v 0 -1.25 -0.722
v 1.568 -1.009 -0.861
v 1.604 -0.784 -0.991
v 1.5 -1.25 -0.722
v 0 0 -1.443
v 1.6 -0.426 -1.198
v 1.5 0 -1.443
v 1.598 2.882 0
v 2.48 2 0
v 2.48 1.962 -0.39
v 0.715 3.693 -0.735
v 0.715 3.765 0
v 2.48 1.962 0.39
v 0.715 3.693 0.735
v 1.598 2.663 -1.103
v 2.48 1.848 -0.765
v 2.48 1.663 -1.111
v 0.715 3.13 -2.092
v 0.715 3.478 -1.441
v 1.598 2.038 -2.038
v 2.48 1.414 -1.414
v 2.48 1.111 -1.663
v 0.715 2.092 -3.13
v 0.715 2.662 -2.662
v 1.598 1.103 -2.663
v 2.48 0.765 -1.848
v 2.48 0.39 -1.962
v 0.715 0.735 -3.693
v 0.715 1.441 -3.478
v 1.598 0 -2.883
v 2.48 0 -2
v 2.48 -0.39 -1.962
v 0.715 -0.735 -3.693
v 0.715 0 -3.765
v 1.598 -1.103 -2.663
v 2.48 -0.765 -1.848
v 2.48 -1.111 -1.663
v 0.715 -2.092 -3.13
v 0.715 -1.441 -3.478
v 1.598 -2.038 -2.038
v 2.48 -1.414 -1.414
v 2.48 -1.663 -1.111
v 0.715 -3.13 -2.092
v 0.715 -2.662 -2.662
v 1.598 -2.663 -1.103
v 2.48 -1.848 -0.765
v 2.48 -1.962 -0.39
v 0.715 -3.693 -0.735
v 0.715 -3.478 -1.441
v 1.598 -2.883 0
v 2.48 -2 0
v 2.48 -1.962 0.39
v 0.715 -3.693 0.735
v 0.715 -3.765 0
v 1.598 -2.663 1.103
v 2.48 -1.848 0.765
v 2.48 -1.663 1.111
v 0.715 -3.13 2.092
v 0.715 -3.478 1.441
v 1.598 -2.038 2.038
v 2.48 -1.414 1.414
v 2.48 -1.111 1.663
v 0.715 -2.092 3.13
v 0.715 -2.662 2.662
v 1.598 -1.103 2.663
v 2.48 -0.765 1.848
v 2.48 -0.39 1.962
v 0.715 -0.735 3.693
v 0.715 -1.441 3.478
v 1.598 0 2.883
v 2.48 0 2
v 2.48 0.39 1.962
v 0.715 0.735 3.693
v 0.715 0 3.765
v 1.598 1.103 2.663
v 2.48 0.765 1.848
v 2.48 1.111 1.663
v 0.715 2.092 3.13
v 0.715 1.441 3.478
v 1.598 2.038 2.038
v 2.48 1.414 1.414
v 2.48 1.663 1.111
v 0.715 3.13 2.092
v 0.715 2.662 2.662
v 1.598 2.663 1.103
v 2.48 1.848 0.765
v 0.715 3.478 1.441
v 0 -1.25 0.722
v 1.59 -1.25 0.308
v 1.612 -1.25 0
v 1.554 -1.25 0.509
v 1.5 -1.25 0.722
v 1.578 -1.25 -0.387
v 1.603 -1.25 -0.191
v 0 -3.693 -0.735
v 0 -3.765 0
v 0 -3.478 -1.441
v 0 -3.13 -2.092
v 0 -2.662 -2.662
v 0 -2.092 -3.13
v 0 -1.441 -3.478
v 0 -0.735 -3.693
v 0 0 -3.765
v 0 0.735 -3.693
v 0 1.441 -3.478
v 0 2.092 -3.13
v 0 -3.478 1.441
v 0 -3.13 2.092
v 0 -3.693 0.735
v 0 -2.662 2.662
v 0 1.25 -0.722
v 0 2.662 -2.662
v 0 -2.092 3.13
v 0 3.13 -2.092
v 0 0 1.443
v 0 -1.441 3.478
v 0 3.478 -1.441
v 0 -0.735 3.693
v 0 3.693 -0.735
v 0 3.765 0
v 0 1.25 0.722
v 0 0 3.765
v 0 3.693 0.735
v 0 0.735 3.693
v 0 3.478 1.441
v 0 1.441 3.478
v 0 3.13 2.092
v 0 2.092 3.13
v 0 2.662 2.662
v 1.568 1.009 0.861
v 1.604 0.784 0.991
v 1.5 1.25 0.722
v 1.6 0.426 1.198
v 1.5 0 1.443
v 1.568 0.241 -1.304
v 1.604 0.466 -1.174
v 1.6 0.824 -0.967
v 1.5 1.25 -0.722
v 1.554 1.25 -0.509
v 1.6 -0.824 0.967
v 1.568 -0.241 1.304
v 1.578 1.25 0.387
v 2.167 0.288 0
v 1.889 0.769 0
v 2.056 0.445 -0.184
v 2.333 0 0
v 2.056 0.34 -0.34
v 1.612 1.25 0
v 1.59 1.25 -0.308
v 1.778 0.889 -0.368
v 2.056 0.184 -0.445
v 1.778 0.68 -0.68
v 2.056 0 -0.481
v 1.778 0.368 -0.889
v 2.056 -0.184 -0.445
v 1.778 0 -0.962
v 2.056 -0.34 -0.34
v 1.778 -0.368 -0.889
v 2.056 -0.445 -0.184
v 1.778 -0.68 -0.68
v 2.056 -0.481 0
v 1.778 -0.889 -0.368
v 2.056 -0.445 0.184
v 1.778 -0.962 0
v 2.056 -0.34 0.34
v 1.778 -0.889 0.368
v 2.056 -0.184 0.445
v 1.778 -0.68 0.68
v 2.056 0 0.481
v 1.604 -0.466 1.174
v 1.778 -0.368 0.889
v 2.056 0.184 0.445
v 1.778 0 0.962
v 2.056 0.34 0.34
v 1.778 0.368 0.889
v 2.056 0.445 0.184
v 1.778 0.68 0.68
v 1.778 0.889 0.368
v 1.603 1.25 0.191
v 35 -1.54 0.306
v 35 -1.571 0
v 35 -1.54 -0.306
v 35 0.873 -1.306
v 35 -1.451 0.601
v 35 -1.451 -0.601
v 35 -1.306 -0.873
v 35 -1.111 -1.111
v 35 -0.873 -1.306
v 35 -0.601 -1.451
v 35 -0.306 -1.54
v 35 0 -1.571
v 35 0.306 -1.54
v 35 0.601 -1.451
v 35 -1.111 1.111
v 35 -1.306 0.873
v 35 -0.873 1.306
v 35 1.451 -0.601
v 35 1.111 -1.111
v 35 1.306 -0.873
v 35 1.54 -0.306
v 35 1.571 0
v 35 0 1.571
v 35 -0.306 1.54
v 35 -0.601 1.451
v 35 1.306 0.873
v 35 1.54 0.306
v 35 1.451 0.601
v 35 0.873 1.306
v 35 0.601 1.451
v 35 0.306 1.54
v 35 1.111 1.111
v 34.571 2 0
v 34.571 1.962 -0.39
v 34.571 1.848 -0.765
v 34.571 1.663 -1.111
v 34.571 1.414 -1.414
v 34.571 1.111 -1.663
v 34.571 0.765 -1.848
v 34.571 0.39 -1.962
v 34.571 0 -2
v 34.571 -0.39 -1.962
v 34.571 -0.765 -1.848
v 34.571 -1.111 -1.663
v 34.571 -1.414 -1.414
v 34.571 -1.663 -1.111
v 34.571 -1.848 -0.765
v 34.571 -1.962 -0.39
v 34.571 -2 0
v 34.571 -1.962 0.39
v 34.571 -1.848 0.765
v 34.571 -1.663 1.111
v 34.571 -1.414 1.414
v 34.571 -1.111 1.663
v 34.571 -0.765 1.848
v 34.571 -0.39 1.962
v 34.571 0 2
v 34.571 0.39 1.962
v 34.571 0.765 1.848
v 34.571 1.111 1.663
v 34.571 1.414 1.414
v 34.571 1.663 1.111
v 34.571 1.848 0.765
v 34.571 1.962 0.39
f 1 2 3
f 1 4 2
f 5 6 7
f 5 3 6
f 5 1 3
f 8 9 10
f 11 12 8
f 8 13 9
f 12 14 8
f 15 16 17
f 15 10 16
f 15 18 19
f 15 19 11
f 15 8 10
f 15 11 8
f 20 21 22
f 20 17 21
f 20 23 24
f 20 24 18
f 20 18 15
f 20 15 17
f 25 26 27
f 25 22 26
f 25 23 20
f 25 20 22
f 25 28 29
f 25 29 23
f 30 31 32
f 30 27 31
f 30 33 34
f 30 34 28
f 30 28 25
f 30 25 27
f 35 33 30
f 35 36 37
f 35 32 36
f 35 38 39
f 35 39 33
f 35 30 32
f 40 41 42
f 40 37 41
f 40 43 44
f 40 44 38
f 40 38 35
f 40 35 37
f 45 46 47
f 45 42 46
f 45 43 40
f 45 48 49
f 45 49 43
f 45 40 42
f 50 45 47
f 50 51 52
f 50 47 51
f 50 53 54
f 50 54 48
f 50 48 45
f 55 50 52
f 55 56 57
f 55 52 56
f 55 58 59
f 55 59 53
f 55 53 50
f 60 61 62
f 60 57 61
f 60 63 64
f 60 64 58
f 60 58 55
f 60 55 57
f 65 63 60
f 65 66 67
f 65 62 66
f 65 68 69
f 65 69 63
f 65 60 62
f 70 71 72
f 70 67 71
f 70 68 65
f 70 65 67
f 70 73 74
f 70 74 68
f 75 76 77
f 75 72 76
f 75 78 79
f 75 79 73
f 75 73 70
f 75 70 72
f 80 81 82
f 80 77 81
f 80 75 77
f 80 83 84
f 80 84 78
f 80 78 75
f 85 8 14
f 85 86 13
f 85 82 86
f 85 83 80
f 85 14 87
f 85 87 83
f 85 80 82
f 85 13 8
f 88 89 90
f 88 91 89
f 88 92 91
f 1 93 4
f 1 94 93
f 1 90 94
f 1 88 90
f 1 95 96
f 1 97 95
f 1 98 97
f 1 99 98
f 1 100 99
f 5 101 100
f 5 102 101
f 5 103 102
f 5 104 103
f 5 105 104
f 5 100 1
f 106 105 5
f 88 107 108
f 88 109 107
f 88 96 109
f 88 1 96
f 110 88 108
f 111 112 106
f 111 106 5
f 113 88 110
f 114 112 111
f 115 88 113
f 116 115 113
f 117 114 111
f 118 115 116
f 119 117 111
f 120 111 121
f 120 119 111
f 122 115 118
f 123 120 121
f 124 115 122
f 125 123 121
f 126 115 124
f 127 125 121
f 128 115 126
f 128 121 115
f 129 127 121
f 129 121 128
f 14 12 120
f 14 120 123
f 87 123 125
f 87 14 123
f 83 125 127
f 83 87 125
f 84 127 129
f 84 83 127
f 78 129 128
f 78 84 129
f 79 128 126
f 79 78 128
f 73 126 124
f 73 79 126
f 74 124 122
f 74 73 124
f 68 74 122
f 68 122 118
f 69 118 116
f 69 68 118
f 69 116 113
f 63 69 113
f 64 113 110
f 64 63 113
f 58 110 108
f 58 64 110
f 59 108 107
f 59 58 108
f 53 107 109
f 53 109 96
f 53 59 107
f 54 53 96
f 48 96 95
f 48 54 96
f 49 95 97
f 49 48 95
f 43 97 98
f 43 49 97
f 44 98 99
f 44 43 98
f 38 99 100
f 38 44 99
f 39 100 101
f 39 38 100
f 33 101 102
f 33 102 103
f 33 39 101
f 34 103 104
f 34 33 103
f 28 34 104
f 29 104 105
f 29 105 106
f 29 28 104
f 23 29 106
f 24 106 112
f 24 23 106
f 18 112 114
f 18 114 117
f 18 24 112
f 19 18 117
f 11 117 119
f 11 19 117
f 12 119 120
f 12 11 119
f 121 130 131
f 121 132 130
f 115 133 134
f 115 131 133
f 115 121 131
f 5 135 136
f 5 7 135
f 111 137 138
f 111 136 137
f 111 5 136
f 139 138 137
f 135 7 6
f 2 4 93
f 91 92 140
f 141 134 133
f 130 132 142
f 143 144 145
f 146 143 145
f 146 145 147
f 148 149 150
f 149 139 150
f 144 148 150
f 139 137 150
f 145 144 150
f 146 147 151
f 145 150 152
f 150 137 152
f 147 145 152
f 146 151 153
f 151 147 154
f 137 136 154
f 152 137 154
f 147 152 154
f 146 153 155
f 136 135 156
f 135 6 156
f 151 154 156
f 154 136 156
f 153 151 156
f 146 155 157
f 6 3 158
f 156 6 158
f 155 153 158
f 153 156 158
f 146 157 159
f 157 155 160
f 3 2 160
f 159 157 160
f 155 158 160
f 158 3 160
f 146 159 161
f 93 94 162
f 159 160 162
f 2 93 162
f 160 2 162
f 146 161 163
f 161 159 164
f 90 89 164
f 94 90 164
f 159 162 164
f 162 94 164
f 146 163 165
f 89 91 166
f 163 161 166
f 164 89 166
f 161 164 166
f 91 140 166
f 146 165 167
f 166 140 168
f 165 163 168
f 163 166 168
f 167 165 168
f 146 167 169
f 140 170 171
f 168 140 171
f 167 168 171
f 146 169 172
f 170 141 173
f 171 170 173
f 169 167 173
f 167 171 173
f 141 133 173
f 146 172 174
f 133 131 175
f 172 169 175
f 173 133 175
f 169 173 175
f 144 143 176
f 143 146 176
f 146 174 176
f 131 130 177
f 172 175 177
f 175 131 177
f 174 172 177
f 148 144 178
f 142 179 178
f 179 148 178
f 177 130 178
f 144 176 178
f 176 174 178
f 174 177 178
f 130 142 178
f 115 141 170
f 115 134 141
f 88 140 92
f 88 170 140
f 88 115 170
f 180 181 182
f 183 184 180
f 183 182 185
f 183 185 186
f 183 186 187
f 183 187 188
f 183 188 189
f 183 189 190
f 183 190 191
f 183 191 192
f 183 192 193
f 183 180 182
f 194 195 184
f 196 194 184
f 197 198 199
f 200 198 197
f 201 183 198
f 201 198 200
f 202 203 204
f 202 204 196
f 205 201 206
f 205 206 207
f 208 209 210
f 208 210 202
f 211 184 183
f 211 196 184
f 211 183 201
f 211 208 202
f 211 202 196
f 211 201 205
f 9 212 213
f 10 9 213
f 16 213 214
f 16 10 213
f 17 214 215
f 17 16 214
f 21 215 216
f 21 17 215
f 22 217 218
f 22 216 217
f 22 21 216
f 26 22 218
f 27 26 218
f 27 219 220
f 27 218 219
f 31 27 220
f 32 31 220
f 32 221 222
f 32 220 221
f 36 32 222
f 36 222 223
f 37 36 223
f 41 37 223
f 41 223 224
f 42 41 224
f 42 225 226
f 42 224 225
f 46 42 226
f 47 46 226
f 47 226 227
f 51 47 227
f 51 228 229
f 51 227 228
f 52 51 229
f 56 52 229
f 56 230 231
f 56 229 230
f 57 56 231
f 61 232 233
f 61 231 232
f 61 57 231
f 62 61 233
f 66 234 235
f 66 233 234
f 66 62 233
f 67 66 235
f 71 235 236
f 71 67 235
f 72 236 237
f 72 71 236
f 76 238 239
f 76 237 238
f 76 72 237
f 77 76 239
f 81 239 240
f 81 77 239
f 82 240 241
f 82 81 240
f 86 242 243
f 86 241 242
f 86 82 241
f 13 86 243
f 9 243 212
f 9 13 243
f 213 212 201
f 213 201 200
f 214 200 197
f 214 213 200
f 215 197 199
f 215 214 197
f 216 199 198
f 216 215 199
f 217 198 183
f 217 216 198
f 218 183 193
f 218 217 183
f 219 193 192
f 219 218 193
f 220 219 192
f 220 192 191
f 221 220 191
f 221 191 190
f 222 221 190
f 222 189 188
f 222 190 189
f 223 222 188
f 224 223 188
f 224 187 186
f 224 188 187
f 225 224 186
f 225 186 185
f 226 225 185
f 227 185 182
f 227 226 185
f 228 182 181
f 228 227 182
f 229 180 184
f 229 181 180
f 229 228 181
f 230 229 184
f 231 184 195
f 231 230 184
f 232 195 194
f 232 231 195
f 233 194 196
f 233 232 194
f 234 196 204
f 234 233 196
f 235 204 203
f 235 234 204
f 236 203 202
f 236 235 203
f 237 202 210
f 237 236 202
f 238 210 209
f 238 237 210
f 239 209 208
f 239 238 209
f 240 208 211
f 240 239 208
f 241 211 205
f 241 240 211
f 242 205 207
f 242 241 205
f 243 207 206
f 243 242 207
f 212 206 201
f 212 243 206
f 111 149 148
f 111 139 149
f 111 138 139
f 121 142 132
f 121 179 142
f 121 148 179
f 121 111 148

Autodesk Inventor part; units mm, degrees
ref_plane "YZ Plane" through (0, 0, 0) normal (1, 0, 0) x (0, 1, 0)
ref_plane "XZ Plane" through (0, 0, 0) normal (0, 1, 0) x (-1, 0, 0)
sketch "Sketch1" plane through (0, 0, 0) normal (0, 0, 1) x (1, 0, 0)
  line L0 (35, 0) -> (35, 2)
  line L1 (35, 2) -> (15, 2)
  line L2 (15, 2) -> (14.5706, 2)
  line L3 (0, 3.765) -> (0, 1.4434)
  line L4 (0, 1.4434) -> (1.5, 1.4434)
  line L5 (1.5, 1.4434) -> (2.3333, 0)
  line L6 (2.3333, 0) -> (35, 0)
  line L7 (0, 3.765) -> (0.715, 3.765)
  line L8 (0.715, 3.765) -> (2.48, 2)
  line L9 (14.5706, 2) -> (2.48, 2)
  line L10 (15, 2) -> (2.48, 2) construction
  line L11 (2.48, 2) -> (2.48, 2)
  line L12 (-7, 0) -> (42, 0) projected
  line L13 (0, -0.753) -> (0, 4.518) projected
  dimension "d0" = 35
  dimension "d1" = 20
  dimension "d2" = 1.5
  dimension "d3" = 4
  dimension "d6" = 2.48
  dimension "d7" = 45
  dimension "d8" = 2.8868
  dimension "d9" = 60
  dimension "d10" = 7.53
  dimension "d11" = 4
  dimension "d12" = 0.4294
revolve "Body" add sketch "Sketch1" angle 360 about axis through (2.3333, 0, 0) along (1, 0, 0) contours L6 L5 L4 L3 L7 L8 L9 L2 L1 L0
sketch "Sketch2" plane through (0, 0, 0) normal (-1, 0, 0) x (0, 0, 1)
  circle A0 centre (0, 0) radius 1.4434 projected
  line L0 (0, -5.271) -> (0, 5.271) projected
  line L1 (-5.271, 0) -> (5.271, 0) projected
  line L2 (1.4434, 0) -> (0.7217, -1.25)
  line L3 (0.7217, -1.25) -> (-0.7217, -1.25)
  line L4 (-0.7217, -1.25) -> (-1.4434, 0)
  line L5 (-1.4434, 0) -> (-0.7217, 1.25)
  line L6 (-0.7217, 1.25) -> (0.7217, 1.25)
  line L7 (0.7217, 1.25) -> (1.4434, 0)
  point P0 (0, 1.4434)
extrude "Slot" add sketch "Sketch2" against normal up to next contours L7 A0 | A0 L2 | L6 L0 A0 | A0 L0 L3 | L0 L6 A0 | A0 L3 L0 | L4 A0 | A0 L5
thread "Thread" size "M4x0.7" class "6g" standard "ISO Metric profile" length 20
chamfer "Chamfer1" distance 0.4294 distance2 0.4294 1 edges at (35, -2, 0) measured on face at (35, -0.292, -0.9006)
ref_plane "Work Plane1" through (104.775, 0, 0) normal (0, 0, -1) x (1, 0, 0)
equation "\"d15\" = GEL"
equation "\"d17\" = -0.5 * SPD + 0.5 * GD"
equation "\"d18\" = GUL"
equation "\"d0\" = NLG"
equation "\"d1\" = GEL"
equation "\"d2\" = INTI"
equation "\"d3\" = GD"
equation "\"d6\" = KOH"
equation "\"d7\" = 0.5 * SEWI"
equation "\"d8\" = 1.1547 * SW"
equation "\"d10\" = KOD"
equation "\"d11\" = BDM"
equation "\"d12\" = GAL"
equation "\"NLG\" = 35"
equation "\"INTI\" = 1.5"
equation "\"GEL\" = 20"
equation "\"GAL\" = 0.61345 * PTC"
equation "\"KOH\" = 2.48"
equation "\"KOD\" = 7.53"
equation "\"GUL\" = 0.61345 * PTC"
equation "\"SPD\" = NND - 1.2269 * PTC"
equation "\"BDM\" = NND"
equation "\"GD\" = NND"
equation "\"SEWI\" = 90deg"
equation "\"SW\" = 2.5"
equation "\"TOA\" = 30deg"
equation "\"GD1\" = THREADDIA - 1.2269 * PTC"
equation "\"EPV\" = 4.48"
equation "\"THREADDIA\" = 4"
equation "\"PTC\" = 0.7"
equation "\"NND\" = 4"
equation "\"E0\" = 1.155 * SW"
properties part number "DIN 7991 - M4  x  35" material "Steel, Mild"
